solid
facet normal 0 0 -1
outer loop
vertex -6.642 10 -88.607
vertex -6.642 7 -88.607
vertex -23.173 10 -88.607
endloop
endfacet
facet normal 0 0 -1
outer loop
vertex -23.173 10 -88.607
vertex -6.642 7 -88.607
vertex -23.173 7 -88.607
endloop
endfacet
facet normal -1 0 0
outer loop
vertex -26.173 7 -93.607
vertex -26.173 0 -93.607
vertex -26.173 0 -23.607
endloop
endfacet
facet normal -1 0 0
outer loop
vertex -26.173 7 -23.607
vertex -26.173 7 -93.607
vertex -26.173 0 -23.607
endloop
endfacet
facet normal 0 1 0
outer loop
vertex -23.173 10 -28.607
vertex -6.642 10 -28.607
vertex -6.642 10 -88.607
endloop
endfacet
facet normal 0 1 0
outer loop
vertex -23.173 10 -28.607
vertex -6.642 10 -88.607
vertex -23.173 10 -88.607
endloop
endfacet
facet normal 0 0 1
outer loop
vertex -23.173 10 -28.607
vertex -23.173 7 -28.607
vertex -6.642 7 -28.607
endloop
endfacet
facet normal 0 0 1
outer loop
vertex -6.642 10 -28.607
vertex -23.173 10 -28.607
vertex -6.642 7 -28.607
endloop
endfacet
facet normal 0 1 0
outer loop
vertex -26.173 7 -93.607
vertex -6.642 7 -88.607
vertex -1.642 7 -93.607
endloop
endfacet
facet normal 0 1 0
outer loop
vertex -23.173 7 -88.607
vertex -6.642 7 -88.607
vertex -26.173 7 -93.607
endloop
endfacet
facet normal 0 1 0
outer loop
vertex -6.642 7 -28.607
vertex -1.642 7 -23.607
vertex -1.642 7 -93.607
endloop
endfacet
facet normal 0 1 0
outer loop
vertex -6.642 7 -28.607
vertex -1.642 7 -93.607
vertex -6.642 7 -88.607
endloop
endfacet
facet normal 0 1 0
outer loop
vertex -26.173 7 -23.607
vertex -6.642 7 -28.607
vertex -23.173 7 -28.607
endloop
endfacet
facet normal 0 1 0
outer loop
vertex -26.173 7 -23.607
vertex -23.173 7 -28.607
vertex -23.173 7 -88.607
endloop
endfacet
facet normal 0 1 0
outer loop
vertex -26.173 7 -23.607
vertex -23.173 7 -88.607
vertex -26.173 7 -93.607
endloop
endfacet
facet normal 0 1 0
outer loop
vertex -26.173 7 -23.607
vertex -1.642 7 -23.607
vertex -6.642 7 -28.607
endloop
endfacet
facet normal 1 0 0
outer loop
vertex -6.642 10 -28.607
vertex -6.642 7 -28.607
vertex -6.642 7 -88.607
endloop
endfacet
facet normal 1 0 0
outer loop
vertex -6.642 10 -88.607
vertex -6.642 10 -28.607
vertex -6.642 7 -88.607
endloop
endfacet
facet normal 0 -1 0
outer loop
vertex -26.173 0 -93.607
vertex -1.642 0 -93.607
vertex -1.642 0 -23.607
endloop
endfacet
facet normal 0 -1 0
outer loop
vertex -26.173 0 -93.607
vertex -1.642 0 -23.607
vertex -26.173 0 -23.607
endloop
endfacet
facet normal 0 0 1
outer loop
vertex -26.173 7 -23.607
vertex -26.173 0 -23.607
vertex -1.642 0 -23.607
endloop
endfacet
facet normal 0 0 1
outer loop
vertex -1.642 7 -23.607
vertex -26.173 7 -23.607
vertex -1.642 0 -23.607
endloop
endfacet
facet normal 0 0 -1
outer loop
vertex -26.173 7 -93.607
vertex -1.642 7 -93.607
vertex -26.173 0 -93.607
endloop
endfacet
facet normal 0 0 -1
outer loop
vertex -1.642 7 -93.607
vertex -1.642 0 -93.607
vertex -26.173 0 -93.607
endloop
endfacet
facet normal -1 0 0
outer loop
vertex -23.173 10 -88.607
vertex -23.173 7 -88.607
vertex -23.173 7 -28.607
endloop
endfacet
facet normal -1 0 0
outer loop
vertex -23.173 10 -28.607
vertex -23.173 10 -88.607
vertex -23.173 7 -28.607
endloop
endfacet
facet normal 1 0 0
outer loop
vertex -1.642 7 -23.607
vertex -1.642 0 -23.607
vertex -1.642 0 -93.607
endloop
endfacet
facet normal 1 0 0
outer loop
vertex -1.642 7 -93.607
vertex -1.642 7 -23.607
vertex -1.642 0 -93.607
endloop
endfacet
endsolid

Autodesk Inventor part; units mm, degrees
ref_plane "YZ Plane" through (0, 0, 0) normal (1, 0, 0) x (0, 1, 0)
ref_plane "XZ Plane" through (0, 0, 0) normal (0, 1, 0) x (-1, 0, 0)
ref_plane "XY Plane" through (0, 0, 0) normal (0, 0, 1) x (1, 0, 0)
sketch "Skizze1" plane through (0, 0, 0) normal (0, 1, 0) x (-1, 0, 0)
  line L0 (26.173, -23.607) -> (1.6422, -23.607)
  line L1 (1.6422, -23.607) -> (1.6422, -93.607)
  line L2 (1.6422, -93.607) -> (26.173, -93.607)
  line L3 (26.173, -93.607) -> (26.173, -23.607)
  line L4 (23.173, -28.607) -> (6.6422, -28.607)
  line L5 (6.6422, -28.607) -> (6.6422, -88.607)
  line L6 (6.6422, -88.607) -> (23.173, -88.607)
  line L7 (23.173, -88.607) -> (23.173, -28.607)
  point P0 (0, 0)
  dimension "d0" = 70
  dimension "d1" = 60
  dimension "d2" = 5
  dimension "d3" = 5
  dimension "d4" = 3
extrude "Extrusion1" add sketch "Skizze1" along normal blind 7
extrude "Extrusion2" add sketch "Skizze1" along normal blind 10 contours L7 L6 L5 L4
properties part number "LCD-Display"
